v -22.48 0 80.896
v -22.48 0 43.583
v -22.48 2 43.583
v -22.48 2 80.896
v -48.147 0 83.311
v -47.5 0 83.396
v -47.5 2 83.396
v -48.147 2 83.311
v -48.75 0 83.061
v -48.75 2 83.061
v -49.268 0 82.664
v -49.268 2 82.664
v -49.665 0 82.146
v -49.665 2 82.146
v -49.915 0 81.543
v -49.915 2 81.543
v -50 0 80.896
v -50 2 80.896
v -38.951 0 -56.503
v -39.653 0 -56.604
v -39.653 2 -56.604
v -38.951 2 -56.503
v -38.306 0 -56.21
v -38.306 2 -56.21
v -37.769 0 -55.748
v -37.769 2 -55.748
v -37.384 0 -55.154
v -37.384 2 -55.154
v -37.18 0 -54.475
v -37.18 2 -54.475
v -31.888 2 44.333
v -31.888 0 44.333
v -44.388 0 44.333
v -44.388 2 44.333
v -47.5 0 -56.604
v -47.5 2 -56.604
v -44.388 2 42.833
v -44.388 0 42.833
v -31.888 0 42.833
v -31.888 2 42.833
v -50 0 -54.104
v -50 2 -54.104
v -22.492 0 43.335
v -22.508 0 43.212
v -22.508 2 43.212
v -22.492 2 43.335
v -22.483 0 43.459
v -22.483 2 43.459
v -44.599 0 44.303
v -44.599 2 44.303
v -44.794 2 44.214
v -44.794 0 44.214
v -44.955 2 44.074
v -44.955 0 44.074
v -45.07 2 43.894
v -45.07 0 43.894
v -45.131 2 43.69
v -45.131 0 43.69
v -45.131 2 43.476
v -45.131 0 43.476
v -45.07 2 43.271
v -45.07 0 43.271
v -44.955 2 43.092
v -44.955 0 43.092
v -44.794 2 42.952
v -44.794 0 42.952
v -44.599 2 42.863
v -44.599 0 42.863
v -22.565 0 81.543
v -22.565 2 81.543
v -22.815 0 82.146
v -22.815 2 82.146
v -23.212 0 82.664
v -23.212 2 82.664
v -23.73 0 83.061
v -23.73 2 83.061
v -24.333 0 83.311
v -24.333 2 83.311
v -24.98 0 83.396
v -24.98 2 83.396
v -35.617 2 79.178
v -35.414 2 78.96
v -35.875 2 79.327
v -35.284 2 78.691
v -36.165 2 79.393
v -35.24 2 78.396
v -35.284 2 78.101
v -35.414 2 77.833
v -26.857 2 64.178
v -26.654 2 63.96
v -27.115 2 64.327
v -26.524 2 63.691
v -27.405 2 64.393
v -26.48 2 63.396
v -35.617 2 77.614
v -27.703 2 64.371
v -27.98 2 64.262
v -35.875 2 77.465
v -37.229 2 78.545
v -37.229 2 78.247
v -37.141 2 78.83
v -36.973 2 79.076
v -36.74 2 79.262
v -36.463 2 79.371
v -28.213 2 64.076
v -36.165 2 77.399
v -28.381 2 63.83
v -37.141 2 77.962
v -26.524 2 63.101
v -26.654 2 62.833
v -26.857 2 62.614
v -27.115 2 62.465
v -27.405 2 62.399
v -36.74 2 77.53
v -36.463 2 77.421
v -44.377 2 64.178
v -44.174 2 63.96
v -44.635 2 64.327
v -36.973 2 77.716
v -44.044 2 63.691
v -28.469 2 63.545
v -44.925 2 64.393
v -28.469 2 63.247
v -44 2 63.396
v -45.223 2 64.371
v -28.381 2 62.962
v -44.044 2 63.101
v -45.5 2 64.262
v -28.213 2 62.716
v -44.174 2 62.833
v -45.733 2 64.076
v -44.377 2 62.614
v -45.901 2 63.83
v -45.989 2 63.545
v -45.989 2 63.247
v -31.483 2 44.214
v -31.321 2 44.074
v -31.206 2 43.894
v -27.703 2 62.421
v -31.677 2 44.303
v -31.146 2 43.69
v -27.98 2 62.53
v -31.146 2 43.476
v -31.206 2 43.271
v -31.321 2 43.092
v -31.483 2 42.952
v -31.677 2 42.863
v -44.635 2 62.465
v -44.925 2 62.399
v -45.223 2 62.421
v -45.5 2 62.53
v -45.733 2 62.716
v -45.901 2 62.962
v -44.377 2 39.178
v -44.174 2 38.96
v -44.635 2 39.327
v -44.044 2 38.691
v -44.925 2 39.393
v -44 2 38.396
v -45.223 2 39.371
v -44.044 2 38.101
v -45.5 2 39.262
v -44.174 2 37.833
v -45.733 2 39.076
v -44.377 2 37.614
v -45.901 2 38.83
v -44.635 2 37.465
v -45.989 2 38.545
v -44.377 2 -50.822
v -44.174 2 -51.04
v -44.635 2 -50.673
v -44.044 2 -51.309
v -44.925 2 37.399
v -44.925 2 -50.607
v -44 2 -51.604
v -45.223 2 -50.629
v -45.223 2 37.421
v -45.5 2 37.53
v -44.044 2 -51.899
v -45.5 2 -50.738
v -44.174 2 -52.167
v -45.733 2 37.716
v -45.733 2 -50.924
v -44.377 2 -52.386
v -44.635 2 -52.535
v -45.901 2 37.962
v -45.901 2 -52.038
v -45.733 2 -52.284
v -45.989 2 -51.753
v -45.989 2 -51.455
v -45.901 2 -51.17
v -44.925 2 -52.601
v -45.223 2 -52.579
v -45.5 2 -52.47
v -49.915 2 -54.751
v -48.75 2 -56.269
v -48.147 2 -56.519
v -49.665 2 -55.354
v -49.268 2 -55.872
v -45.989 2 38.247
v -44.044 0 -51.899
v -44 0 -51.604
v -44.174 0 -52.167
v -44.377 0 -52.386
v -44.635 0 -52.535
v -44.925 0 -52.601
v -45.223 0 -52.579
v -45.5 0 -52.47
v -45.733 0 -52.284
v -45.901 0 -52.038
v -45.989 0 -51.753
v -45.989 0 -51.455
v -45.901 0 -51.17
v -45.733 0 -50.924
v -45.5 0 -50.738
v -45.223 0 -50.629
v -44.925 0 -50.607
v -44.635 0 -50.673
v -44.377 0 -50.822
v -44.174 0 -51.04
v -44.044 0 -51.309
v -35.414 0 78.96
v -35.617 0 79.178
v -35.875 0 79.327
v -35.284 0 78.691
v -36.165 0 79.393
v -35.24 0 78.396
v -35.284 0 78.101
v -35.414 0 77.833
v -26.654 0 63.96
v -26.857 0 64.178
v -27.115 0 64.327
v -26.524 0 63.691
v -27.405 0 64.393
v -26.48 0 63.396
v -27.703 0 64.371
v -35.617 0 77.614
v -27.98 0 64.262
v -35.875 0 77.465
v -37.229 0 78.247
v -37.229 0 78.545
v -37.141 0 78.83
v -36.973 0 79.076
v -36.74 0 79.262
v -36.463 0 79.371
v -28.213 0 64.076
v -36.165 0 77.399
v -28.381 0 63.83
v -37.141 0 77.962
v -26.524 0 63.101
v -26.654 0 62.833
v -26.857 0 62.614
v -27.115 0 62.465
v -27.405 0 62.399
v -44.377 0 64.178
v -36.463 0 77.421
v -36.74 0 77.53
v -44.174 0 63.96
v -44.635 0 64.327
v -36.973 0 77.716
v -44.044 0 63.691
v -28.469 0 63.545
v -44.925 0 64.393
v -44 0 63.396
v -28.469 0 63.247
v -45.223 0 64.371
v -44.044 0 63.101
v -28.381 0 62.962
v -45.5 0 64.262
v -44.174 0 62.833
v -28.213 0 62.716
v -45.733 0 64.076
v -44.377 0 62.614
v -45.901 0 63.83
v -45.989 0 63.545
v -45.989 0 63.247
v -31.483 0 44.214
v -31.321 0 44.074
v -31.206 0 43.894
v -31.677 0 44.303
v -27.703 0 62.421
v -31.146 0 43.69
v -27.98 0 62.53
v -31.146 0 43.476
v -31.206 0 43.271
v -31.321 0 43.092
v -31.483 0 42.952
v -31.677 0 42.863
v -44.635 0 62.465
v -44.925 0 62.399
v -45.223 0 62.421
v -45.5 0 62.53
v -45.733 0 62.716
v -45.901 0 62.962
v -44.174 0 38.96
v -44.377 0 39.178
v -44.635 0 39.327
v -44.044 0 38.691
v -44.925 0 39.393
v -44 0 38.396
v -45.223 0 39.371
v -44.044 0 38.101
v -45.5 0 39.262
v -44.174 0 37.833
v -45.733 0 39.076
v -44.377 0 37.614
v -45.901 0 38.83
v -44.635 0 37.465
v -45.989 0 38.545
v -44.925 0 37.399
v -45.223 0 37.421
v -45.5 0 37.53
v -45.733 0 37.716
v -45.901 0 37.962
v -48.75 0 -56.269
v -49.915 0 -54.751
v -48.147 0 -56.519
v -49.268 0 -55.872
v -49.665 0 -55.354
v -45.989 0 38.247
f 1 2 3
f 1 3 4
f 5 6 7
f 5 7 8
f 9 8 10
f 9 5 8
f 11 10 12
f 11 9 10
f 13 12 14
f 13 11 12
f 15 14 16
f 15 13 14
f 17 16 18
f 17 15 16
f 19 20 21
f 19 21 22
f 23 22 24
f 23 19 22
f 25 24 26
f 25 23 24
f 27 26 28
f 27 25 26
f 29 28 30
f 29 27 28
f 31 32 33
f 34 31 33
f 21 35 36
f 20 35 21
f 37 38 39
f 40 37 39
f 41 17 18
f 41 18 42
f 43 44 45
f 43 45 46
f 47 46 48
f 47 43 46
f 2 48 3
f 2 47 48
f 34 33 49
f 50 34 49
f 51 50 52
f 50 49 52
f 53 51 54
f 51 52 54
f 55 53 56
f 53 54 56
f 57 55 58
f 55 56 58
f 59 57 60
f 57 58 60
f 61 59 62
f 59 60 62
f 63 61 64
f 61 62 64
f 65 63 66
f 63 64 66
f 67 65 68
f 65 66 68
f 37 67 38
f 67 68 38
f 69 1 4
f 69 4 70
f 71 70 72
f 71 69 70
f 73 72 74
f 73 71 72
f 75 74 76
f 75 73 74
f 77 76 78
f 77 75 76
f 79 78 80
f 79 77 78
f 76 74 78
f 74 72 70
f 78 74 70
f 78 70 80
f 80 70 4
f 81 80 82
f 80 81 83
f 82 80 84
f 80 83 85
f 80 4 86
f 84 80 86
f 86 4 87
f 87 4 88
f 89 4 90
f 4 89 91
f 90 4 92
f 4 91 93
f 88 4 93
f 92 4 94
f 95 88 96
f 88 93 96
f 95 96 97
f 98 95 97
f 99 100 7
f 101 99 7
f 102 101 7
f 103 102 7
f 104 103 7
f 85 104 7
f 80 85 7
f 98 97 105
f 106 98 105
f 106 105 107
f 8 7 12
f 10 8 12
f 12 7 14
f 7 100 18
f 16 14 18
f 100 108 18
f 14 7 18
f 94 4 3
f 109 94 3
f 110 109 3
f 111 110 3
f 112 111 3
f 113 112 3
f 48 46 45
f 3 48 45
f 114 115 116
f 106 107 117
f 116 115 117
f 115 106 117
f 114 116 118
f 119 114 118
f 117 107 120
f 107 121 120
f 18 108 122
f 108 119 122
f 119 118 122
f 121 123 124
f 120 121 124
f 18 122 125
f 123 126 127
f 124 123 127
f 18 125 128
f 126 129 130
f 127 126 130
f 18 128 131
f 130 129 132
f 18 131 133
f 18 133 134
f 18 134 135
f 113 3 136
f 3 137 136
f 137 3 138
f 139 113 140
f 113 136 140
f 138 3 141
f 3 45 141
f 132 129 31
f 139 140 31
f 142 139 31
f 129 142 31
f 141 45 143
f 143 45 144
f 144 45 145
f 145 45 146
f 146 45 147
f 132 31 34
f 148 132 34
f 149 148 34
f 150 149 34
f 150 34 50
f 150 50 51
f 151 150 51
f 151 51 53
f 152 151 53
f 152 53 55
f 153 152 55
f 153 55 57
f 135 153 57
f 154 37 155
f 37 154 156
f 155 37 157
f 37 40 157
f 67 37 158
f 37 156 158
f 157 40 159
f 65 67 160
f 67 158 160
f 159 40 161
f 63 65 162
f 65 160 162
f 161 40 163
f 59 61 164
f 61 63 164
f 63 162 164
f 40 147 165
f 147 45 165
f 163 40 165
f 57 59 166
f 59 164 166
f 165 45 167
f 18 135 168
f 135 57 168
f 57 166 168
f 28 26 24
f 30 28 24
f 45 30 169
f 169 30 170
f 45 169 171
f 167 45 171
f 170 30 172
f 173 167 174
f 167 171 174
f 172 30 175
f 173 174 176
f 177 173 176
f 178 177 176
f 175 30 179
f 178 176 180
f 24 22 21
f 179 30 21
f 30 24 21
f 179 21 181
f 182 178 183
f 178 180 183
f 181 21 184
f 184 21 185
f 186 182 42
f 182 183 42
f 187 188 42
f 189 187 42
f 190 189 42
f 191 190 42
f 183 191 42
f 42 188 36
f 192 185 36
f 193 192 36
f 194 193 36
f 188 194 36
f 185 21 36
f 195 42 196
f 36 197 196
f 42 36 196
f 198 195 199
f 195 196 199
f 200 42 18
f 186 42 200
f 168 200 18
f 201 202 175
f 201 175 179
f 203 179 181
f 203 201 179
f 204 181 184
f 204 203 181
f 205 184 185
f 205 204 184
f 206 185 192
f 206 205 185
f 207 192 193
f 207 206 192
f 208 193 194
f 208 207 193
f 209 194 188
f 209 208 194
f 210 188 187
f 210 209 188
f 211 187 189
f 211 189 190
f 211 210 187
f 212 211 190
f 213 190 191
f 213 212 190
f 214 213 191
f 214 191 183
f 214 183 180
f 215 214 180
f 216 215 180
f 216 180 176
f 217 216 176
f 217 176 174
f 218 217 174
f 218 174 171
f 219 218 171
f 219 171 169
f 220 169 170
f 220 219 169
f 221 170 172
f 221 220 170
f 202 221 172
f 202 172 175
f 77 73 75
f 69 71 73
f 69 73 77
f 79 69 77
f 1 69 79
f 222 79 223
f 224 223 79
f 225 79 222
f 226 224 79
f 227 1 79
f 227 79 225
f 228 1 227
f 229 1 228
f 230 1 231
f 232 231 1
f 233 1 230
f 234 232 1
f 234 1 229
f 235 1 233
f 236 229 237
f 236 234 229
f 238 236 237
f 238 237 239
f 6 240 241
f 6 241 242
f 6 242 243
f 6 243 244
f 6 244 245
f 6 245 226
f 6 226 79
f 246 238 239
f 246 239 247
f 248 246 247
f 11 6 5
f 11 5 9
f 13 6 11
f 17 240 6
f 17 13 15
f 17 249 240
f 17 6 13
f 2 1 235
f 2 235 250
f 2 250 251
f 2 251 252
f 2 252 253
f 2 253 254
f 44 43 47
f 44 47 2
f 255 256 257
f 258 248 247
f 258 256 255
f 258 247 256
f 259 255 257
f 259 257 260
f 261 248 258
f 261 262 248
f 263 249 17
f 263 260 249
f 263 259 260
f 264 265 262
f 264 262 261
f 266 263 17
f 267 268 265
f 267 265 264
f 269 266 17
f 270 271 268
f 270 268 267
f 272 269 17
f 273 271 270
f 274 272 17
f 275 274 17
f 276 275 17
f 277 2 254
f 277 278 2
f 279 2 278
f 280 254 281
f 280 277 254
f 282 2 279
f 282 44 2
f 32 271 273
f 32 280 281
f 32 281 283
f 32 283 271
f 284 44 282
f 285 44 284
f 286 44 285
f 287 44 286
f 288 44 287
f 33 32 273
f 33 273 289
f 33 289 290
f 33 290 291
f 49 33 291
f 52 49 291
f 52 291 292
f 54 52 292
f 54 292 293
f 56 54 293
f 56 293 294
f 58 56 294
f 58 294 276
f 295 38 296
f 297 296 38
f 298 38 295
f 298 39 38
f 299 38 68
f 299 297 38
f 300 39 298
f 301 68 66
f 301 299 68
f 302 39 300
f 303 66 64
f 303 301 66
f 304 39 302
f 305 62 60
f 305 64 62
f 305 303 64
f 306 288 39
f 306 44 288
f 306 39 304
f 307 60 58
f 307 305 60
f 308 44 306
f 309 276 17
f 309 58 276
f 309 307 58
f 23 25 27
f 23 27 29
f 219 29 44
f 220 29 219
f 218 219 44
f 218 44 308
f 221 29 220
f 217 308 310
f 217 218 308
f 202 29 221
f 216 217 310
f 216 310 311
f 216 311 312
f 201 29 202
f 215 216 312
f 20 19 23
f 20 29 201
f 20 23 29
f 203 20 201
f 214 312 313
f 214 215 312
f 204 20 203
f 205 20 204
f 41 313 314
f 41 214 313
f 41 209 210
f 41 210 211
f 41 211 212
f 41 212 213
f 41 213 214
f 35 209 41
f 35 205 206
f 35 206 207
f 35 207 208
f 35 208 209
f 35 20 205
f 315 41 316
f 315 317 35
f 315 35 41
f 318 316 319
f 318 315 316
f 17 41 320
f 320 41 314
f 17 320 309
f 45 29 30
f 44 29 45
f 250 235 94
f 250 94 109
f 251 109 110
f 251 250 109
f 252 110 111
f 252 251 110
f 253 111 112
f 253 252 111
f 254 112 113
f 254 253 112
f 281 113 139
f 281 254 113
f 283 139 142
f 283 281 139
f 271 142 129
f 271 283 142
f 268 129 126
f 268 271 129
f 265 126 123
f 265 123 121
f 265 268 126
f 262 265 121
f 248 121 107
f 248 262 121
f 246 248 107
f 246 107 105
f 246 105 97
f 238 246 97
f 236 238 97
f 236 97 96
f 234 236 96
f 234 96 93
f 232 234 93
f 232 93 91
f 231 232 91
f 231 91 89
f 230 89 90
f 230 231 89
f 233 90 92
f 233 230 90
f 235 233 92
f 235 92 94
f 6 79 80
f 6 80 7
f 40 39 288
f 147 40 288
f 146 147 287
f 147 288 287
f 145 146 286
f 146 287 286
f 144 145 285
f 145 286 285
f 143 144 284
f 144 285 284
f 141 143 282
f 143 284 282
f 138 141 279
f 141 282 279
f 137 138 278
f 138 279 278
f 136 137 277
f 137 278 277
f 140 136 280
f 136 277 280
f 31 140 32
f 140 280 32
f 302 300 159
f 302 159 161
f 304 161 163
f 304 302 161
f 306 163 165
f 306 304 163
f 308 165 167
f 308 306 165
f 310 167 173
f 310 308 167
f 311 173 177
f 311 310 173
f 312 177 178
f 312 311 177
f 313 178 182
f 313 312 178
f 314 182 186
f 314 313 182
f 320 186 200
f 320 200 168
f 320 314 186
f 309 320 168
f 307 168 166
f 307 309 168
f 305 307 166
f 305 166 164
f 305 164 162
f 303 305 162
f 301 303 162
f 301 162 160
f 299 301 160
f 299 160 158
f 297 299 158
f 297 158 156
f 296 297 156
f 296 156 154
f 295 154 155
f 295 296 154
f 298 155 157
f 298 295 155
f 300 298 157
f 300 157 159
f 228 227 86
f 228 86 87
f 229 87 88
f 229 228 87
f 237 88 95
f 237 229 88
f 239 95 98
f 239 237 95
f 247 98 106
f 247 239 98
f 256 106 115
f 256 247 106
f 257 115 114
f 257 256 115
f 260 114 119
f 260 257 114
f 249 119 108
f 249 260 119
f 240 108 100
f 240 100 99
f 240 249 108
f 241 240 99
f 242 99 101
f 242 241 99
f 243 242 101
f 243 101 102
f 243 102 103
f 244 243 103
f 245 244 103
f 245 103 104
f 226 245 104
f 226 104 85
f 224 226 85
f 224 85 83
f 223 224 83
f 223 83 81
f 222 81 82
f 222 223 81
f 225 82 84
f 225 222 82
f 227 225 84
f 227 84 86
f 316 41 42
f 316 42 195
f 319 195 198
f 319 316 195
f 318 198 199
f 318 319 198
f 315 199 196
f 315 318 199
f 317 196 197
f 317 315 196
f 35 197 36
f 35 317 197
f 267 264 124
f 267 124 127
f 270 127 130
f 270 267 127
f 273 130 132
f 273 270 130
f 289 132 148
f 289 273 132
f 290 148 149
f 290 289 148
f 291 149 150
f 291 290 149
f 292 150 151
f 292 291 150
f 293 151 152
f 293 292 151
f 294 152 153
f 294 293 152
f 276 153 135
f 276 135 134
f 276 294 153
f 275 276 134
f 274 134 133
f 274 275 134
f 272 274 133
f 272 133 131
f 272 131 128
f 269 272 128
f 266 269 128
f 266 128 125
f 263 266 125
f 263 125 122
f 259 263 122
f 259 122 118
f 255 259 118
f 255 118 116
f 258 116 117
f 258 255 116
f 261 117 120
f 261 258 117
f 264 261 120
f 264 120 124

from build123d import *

# Parameters (mm, degrees)
SKETCH1_R           = 1
BOSS_EXTRUDE1_DEPTH = 2


with BuildPart() as part:
    # Sketch1 → Boss-Extrude1 (new body)
    with BuildSketch(Plane(origin=(0, 0, 0), x_dir=(1, 0, 0), z_dir=(0, 1, 0))):
        with BuildLine():
            Line((-50, -63.396226415), (-50, 54.103773585))
            ThreePointArc((-50, 54.103773585), (-49.267766953, 55.871540538), (-47.5, 56.603773585))
            Line((-47.5, 56.603773585), (-39.652542771, 56.603773585))
            ThreePointArc((-39.652542771, 56.603773585), (-38.021337196, 55.998283646), (-37.180274472, 54.475108283))
            Line((-37.180274472, 54.475108283), (-22.507731701, -43.211594583))
            ThreePointArc((-22.507731701, -43.211594583), (-22.486942565, -43.396744894), (-22.48, -43.582929282))
            Line((-22.48, -43.582929282), (-22.48, -63.396226415))
            Line((-22.48, -63.396226415), (-22.48, -78.396226415))
            Line((-22.48, -78.396226415), (-22.48, -80.896226415))
            ThreePointArc((-22.48, -80.896226415), (-23.212233047, -82.663993368), (-24.98, -83.396226415))
            Line((-24.98, -83.396226415), (-47.5, -83.396226415))
            ThreePointArc((-47.5, -83.396226415), (-49.267766953, -82.663993368), (-50, -80.896226415))
            Line((-50, -80.896226415), (-50, -78.396226415))
            Line((-50, -78.396226415), (-50, -63.396226415))
        make_face()
        with Locations((-36.24, -78.396226415)):
            Circle(SKETCH1_R, mode=Mode.SUBTRACT)
        with Locations((-45, -63.396226415)):
            Circle(SKETCH1_R, mode=Mode.SUBTRACT)
        with Locations((-27.48, -63.396226415)):
            Circle(SKETCH1_R, mode=Mode.SUBTRACT)
        with Locations((-45, -38.396226415)):
            Circle(SKETCH1_R, mode=Mode.SUBTRACT)
        with Locations((-45, 51.603773585)):
            Circle(SKETCH1_R, mode=Mode.SUBTRACT)
        with BuildLine():
            Line((-44.38816659, -42.832929282), (-31.88816659, -42.832929282))
            ThreePointArc((-31.88816659, -42.832929282), (-31.13816659, -43.582929282), (-31.88816659, -44.332929282))
            Line((-31.88816659, -44.332929282), (-44.38816659, -44.332929282))
            ThreePointArc((-44.38816659, -44.332929282), (-45.13816659, -43.582929282), (-44.38816659, -42.832929282))
        make_face(mode=Mode.SUBTRACT)
    extrude(amount=BOSS_EXTRUDE1_DEPTH)


solid = part.part
